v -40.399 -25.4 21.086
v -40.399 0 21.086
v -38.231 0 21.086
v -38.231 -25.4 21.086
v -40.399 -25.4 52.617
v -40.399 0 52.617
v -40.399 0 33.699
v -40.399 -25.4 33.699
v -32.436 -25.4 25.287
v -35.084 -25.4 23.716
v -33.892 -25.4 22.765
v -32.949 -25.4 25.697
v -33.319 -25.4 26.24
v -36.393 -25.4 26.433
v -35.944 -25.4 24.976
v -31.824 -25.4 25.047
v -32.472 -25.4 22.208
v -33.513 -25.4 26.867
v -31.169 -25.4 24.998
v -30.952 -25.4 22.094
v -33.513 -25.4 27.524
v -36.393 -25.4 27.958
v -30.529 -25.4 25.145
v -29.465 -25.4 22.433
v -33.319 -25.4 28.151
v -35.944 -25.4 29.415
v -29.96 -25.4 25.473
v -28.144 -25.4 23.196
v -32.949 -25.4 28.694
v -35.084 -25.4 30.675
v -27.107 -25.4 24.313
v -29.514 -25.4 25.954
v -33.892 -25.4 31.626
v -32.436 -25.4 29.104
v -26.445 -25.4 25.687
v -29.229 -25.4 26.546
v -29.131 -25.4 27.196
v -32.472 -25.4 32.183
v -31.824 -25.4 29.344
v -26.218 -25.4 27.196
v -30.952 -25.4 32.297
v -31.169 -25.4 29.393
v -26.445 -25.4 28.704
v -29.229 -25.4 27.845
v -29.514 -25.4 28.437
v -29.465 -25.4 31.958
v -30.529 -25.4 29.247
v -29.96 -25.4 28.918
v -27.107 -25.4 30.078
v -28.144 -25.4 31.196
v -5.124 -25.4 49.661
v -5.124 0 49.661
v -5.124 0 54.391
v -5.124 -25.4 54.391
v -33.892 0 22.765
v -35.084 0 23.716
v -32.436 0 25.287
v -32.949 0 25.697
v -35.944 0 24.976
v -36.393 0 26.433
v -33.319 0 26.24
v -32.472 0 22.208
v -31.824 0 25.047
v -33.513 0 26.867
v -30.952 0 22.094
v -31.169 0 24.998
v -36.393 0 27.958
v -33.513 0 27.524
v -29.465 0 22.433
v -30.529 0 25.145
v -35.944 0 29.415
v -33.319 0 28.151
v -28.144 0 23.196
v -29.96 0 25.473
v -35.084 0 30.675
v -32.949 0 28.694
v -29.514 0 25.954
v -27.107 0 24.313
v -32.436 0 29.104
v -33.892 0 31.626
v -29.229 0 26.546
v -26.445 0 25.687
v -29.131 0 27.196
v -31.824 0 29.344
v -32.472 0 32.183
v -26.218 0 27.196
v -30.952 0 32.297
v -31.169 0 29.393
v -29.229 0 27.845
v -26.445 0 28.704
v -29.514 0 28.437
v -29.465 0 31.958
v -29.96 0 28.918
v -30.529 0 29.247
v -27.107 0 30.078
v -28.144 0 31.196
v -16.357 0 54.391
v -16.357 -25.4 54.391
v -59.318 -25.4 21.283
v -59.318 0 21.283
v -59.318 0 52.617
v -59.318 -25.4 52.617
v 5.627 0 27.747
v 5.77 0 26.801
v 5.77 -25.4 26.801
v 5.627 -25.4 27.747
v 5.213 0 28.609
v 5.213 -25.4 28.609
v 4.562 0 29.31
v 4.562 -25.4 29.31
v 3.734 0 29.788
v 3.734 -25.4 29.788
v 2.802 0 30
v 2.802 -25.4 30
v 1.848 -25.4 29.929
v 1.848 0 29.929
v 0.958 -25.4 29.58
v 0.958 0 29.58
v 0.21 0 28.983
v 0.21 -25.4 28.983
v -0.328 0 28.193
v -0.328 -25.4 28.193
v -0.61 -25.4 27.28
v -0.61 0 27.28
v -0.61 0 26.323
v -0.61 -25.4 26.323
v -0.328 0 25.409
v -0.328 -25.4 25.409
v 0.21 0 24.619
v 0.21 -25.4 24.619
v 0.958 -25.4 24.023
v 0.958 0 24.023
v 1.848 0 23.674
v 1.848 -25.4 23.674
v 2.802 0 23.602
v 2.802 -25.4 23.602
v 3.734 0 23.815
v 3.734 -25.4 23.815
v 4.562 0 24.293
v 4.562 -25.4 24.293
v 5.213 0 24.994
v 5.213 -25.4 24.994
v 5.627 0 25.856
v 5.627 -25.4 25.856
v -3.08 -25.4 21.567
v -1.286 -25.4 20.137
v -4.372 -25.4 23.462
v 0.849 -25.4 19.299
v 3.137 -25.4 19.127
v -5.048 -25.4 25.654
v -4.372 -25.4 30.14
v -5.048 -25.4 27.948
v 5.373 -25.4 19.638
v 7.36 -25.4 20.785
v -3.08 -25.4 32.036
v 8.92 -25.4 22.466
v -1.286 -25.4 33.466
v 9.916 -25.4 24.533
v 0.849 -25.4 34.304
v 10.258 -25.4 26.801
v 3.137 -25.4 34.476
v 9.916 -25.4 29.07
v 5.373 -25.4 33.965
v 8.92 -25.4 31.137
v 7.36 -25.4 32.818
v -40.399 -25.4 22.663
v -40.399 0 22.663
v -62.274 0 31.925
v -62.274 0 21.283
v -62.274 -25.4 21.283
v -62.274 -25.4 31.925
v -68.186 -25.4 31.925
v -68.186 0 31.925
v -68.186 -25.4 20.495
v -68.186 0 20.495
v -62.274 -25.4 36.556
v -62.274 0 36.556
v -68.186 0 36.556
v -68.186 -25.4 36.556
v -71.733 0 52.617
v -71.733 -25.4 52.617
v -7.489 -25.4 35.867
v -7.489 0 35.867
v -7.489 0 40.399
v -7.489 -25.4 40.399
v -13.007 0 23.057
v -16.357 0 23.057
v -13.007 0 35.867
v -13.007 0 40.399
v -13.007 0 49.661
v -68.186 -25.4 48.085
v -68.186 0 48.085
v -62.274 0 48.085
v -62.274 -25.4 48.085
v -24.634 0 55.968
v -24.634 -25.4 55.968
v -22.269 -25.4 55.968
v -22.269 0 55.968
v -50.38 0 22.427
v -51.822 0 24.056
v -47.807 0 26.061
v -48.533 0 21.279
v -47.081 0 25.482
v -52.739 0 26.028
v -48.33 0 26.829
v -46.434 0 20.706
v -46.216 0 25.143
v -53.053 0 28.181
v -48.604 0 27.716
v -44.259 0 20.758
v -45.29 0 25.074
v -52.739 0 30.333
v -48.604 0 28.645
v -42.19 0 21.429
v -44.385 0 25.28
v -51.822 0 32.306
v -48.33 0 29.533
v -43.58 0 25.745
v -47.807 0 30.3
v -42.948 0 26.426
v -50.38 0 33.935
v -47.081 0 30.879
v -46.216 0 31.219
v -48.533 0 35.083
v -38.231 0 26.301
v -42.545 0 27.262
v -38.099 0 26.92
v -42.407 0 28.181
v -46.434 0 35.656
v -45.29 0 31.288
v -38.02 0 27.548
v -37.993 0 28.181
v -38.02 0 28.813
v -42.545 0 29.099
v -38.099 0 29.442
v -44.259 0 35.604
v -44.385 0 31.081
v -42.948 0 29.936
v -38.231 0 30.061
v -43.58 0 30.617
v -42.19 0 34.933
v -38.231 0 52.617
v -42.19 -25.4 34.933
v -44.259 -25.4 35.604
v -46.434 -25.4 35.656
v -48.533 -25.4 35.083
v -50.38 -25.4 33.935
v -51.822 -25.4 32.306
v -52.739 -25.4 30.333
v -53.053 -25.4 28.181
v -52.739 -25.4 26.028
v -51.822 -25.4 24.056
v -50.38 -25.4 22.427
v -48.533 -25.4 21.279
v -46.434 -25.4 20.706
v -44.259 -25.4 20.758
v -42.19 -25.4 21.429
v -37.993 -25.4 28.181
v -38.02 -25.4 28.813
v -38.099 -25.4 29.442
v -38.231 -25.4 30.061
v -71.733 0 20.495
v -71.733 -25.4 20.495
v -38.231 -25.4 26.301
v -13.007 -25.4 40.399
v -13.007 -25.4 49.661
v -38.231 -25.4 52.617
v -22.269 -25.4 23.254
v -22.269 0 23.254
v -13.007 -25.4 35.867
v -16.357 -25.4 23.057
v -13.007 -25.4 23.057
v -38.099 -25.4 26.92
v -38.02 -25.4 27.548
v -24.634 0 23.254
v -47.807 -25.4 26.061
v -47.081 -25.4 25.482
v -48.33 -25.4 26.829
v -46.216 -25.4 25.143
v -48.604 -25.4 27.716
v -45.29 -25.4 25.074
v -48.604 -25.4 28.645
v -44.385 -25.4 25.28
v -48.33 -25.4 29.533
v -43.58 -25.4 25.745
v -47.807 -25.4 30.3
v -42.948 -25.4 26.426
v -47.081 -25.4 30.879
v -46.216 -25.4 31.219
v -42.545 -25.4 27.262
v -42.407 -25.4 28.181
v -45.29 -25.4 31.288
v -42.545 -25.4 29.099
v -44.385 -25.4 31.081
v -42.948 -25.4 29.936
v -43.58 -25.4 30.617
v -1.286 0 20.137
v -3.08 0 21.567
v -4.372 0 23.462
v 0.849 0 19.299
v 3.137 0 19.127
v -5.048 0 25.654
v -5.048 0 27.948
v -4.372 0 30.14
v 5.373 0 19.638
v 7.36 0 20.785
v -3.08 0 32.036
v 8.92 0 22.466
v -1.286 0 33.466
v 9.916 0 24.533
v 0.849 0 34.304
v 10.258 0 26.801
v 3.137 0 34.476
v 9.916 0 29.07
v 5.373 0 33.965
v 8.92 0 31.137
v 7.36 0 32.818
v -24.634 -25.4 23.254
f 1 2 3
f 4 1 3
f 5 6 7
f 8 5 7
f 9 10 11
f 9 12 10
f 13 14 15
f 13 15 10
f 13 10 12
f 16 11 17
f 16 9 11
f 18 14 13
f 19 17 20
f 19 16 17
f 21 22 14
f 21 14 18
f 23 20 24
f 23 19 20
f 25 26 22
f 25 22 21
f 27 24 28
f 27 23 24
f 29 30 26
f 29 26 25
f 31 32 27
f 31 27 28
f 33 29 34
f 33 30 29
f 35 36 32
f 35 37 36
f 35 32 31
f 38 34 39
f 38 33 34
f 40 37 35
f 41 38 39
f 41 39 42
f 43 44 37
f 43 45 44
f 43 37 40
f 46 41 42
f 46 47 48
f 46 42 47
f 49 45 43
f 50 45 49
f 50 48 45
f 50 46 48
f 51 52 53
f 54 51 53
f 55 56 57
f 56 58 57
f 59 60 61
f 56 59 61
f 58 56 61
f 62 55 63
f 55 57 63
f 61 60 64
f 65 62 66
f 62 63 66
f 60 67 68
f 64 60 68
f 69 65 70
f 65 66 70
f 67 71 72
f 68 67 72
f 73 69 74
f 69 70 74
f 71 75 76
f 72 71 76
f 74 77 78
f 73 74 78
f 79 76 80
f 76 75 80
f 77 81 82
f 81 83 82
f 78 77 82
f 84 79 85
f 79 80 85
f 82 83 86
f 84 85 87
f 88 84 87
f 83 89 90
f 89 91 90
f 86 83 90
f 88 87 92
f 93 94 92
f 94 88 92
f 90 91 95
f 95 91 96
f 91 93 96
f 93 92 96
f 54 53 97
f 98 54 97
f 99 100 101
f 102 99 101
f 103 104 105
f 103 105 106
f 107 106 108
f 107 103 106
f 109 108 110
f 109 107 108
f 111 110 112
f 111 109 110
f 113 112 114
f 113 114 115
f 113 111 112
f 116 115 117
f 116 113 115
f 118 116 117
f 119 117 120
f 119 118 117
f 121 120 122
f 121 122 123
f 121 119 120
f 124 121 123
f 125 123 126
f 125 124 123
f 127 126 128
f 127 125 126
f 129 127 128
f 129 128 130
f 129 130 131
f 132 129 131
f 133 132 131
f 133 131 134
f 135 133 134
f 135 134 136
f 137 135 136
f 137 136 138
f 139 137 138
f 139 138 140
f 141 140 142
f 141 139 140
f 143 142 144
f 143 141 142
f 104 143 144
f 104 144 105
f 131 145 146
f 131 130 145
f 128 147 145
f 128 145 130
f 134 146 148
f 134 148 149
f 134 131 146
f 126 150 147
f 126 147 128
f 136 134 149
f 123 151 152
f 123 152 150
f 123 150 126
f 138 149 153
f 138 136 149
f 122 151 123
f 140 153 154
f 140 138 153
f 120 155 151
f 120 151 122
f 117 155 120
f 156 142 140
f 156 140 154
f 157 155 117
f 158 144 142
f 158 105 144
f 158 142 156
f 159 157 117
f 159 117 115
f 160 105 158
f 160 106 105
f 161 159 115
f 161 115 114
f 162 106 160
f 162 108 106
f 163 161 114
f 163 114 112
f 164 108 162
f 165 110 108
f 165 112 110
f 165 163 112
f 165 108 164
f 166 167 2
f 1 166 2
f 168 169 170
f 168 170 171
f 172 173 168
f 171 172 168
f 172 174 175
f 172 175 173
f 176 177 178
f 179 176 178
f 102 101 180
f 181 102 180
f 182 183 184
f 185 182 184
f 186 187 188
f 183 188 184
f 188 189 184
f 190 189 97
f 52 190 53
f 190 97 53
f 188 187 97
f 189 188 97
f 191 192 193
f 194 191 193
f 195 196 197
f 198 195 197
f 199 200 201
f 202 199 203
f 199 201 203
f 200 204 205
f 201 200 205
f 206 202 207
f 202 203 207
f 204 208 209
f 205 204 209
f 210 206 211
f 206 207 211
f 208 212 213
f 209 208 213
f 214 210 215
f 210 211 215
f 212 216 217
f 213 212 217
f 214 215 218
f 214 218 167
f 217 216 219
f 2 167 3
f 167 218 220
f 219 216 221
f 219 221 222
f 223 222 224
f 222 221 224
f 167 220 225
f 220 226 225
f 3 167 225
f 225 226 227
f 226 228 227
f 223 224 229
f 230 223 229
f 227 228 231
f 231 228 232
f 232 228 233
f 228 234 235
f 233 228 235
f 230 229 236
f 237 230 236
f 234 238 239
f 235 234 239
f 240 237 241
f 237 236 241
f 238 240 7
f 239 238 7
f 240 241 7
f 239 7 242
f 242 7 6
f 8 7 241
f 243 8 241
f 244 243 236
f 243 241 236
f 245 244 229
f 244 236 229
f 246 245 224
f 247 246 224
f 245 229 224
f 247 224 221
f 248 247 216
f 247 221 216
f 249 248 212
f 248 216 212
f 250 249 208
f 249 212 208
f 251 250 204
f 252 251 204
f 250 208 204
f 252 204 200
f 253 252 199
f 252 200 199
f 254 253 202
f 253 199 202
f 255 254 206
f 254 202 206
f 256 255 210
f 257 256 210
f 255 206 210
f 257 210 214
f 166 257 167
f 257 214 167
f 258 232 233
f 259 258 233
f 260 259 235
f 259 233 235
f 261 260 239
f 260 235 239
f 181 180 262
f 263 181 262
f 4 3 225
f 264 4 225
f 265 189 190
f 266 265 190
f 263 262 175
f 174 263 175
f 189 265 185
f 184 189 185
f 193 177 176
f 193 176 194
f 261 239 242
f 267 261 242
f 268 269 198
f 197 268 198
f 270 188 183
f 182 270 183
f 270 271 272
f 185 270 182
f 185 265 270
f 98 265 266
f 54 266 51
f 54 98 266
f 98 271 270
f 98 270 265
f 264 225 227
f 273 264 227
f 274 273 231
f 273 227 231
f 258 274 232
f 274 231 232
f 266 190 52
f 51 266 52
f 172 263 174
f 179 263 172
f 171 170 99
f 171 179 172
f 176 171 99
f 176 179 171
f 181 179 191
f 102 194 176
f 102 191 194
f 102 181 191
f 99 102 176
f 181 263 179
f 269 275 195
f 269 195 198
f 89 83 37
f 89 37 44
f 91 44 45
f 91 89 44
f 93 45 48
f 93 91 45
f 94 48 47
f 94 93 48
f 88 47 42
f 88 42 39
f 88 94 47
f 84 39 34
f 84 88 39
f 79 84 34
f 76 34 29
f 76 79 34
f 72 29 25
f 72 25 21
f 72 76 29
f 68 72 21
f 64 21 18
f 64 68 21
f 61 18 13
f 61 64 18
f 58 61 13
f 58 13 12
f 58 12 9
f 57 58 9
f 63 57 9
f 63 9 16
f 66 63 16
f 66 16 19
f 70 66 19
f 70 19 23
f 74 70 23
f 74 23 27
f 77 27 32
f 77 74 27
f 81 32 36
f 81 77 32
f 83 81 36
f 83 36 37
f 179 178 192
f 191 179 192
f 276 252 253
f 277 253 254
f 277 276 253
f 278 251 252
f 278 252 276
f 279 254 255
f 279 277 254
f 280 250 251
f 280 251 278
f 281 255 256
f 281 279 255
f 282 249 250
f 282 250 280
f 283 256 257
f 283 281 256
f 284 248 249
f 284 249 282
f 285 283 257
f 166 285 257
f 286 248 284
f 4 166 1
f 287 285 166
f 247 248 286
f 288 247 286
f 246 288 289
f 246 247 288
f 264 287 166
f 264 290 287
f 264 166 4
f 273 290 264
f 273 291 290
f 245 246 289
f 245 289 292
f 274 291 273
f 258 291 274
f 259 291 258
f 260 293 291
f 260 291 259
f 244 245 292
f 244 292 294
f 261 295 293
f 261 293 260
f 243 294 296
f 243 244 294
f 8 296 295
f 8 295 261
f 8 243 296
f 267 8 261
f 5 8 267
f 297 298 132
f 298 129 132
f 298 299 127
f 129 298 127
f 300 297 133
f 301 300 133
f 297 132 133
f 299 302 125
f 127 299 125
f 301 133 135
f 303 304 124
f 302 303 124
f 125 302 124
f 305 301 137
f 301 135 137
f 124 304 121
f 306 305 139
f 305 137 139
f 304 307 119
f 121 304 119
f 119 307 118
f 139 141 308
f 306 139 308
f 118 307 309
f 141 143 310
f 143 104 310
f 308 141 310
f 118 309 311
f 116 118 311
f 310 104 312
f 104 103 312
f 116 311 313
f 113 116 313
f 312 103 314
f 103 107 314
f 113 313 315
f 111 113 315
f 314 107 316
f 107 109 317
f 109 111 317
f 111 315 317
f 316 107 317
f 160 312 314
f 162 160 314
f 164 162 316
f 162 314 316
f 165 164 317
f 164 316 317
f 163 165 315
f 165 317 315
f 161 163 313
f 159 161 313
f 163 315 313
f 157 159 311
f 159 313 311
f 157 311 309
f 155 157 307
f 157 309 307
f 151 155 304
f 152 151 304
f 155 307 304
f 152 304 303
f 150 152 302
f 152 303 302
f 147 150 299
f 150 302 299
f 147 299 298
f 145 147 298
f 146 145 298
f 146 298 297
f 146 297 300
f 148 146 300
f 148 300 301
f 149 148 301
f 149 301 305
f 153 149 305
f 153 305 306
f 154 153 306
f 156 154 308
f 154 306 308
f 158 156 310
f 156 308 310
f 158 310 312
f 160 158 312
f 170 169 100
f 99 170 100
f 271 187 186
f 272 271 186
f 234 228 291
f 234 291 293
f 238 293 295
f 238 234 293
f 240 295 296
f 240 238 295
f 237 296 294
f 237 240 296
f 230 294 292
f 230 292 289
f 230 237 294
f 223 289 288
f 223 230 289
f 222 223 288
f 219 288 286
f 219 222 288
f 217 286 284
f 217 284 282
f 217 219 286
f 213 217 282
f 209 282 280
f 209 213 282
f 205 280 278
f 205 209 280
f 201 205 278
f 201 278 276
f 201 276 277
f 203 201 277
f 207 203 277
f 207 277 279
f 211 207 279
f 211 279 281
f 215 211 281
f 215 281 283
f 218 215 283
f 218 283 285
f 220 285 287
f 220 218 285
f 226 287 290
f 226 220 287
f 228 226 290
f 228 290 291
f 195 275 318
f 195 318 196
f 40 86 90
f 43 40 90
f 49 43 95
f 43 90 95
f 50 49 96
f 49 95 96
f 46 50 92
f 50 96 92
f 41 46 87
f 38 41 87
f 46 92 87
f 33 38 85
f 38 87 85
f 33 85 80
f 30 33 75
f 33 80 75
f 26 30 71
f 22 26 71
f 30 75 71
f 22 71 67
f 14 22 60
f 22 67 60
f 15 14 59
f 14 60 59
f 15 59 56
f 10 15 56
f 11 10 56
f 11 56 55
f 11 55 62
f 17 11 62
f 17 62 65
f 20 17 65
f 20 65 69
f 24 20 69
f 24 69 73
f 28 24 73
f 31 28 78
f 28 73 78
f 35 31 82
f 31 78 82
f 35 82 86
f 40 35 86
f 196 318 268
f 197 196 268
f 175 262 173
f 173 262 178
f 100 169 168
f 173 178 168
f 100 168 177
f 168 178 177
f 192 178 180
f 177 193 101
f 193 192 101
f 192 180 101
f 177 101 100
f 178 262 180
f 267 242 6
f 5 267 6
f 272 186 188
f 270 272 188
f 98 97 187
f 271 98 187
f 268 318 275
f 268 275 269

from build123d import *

# Parameters (mm, degrees)
F0_R     = 3.1159339581
F1_DEPTH = 25.4
F0_R_2   = 5.1162080429
F0_R_3   = 2.2032969486
F0_R_4   = 7.6957887985
F0_R_5   = 3.2080491059
F0_W     = 3.5472363234
F0_H     = 11.4299990237
F0_H_2   = 4.6311207116
F0_W_2   = 5.9120729566
F0_H_3   = 11.5285366774
F0_W_3   = 2.956032753
F0_H_4   = 10.6417238712
F0_H_5   = 4.5325830579
F0_W_4   = 2.3648291826
F0_H_6   = 32.7134504914
F0_W_5   = 3.3501712605
F0_H_7   = 4.72965464
F0_W_6   = 7.882758975
F0_H_8   = 9.2622414231
F0_H_9   = 4.5325867832
F0_W_7   = 5.5179311894
F0_H_10  = 12.8094814718


with BuildPart() as f1:
    # F0 (on Front) → F1 (new body)
    with BuildSketch(Plane.XZ):
        with BuildLine():
            ThreePointArc((-38.2313802838, 26.3009390762), (-38.052785096, 27.2333697377), (-37.9929362453, 28.1808618456))
            ThreePointArc((-37.9929362453, 28.1808618456), (-38.052785096, 29.1283539536), (-38.2313802838, 30.0607846151))
            Line((-38.2313802838, 30.0607846151), (-38.2313802838, 26.3009390762))
        make_face()
        with BuildLine():
            Line((-38.2313802838, 26.3009390762), (-38.2313802838, 30.0607846151))
            ThreePointArc((-38.2313802838, 30.0607846151), (-39.0542396891, 32.0353210522), (-40.3991378844, 33.6987935007))
            Line((-40.3991378844, 33.6987935007), (-40.3991378844, 22.6629301906))
            ThreePointArc((-40.3991378844, 22.6629301906), (-39.0542396891, 24.326402639), (-38.2313802838, 26.3009390762))
        make_face()
        with BuildLine():
            ThreePointArc((-40.3991378844, 33.6987935007), (-39.0542396891, 32.0353210522), (-38.2313802838, 30.0607846151))
            Line((-38.2313802838, 30.0607846151), (-38.2313802838, 52.6174120605))
            Line((-38.2313802838, 52.6174120605), (-40.3991378844, 52.6174120605))
            Line((-40.3991378844, 52.6174120605), (-40.3991378844, 33.6987935007))
        make_face()
        with BuildLine():
            Line((-38.2313802838, 21.0863798857), (-38.2313802838, 26.3009390762))
            ThreePointArc((-38.2313802838, 26.3009390762), (-39.0542396891, 24.326402639), (-40.3991378844, 22.6629301906))
            Line((-40.3991378844, 22.6629301906), (-40.3991378844, 21.0863798857))
            Line((-40.3991378844, 21.0863798857), (-38.2313802838, 21.0863798857))
        make_face()
        with BuildLine():
            Line((-40.3991378844, 22.6629301906), (-40.3991378844, 33.6987935007))
            ThreePointArc((-40.3991378844, 33.6987935007), (-53.0529276811, 28.1808618456), (-40.3991378844, 22.6629301906))
        make_face()
        with Locations((-45.5229319632, 28.1808618456)):
            Circle(F0_R, mode=Mode.SUBTRACT)
    extrude(amount=F1_DEPTH)


with BuildPart() as f1b:
    # F0 (on Front) → F1, piece 2 (new body)
    with BuildSketch(Plane.XZ):
        with Locations((-31.333964318, 27.1955169737)):
            Circle(F0_R_2)
        with Locations((-31.333964318, 27.1955169737)):
            Circle(F0_R_3, mode=Mode.SUBTRACT)
    extrude(amount=F1_DEPTH)


with BuildPart() as f1c:
    # F0 (on Front) → F1, piece 3 (new body)
    with BuildSketch(Plane.XZ):
        with Locations((2.5618970394, 26.8013793975)):
            Circle(F0_R_4)
        with Locations((2.5618970394, 26.8013793975)):
            Circle(F0_R_5, mode=Mode.SUBTRACT)
    extrude(amount=F1_DEPTH)


with BuildPart() as f1d:
    # F0 (on Front) → F1, piece 4 (new body)
    with BuildSketch(Plane.XZ):
        with Locations((-69.9594840407, 26.2101721019)):
            Rectangle(F0_W, F0_H)
        with Locations((-69.9594840407, 34.2407319695)):
            Rectangle(F0_W, F0_H_2)
        with Locations((-65.2298294008, 34.2407319695)):
            Rectangle(F0_W_2, F0_H_2)
        with Locations((-69.9594840407, 42.3205606639)):
            Rectangle(F0_W, F0_H_3)
        with Locations((-60.795776546, 26.6043096781)):
            Rectangle(F0_W_3, F0_H_4)
        with Locations((-60.795776546, 34.2407319695)):
            Rectangle(F0_W_3, F0_H_2)
        with Locations((-69.9594840407, 50.3511205316)):
            Rectangle(F0_W, F0_H_5)
        with Locations((-65.2298294008, 50.3511205316)):
            Rectangle(F0_W_2, F0_H_5)
        with Locations((-60.795776546, 42.3205606639)):
            Rectangle(F0_W_3, F0_H_3)
        with Locations((-60.795776546, 50.3511205316)):
            Rectangle(F0_W_3, F0_H_5)
    extrude(amount=F1_DEPTH)


with BuildPart() as f1e:
    # F0 (on Front) → F1, piece 5 (new body)
    with BuildSketch(Plane.XZ):
        with Locations((-23.4512072057, 39.6108627319)):
            Rectangle(F0_W_4, F0_H_6)
    extrude(amount=F1_DEPTH)


with BuildPart() as f1f:
    # F0 (on Front) → F1, piece 6 (new body)
    with BuildSketch(Plane.XZ):
        with Locations((-14.6816377528, 52.0262066275)):
            Rectangle(F0_W_5, F0_H_7)
        with Locations((-9.065172635, 52.0262066275)):
            Rectangle(F0_W_6, F0_H_7)
        with Locations((-14.6816377528, 45.0302585959)):
            Rectangle(F0_W_5, F0_H_8)
        with Locations((-14.6816377528, 38.1328444928)):
            Rectangle(F0_W_5, F0_H_9)
        with Locations((-10.2475865278, 38.1328444928)):
            Rectangle(F0_W_7, F0_H_9)
        with Locations((-14.6816377528, 29.4618103653)):
            Rectangle(F0_W_5, F0_H_10)
    extrude(amount=F1_DEPTH)


solid = Compound([f1.part, f1b.part, f1c.part, f1d.part, f1e.part, f1f.part])
